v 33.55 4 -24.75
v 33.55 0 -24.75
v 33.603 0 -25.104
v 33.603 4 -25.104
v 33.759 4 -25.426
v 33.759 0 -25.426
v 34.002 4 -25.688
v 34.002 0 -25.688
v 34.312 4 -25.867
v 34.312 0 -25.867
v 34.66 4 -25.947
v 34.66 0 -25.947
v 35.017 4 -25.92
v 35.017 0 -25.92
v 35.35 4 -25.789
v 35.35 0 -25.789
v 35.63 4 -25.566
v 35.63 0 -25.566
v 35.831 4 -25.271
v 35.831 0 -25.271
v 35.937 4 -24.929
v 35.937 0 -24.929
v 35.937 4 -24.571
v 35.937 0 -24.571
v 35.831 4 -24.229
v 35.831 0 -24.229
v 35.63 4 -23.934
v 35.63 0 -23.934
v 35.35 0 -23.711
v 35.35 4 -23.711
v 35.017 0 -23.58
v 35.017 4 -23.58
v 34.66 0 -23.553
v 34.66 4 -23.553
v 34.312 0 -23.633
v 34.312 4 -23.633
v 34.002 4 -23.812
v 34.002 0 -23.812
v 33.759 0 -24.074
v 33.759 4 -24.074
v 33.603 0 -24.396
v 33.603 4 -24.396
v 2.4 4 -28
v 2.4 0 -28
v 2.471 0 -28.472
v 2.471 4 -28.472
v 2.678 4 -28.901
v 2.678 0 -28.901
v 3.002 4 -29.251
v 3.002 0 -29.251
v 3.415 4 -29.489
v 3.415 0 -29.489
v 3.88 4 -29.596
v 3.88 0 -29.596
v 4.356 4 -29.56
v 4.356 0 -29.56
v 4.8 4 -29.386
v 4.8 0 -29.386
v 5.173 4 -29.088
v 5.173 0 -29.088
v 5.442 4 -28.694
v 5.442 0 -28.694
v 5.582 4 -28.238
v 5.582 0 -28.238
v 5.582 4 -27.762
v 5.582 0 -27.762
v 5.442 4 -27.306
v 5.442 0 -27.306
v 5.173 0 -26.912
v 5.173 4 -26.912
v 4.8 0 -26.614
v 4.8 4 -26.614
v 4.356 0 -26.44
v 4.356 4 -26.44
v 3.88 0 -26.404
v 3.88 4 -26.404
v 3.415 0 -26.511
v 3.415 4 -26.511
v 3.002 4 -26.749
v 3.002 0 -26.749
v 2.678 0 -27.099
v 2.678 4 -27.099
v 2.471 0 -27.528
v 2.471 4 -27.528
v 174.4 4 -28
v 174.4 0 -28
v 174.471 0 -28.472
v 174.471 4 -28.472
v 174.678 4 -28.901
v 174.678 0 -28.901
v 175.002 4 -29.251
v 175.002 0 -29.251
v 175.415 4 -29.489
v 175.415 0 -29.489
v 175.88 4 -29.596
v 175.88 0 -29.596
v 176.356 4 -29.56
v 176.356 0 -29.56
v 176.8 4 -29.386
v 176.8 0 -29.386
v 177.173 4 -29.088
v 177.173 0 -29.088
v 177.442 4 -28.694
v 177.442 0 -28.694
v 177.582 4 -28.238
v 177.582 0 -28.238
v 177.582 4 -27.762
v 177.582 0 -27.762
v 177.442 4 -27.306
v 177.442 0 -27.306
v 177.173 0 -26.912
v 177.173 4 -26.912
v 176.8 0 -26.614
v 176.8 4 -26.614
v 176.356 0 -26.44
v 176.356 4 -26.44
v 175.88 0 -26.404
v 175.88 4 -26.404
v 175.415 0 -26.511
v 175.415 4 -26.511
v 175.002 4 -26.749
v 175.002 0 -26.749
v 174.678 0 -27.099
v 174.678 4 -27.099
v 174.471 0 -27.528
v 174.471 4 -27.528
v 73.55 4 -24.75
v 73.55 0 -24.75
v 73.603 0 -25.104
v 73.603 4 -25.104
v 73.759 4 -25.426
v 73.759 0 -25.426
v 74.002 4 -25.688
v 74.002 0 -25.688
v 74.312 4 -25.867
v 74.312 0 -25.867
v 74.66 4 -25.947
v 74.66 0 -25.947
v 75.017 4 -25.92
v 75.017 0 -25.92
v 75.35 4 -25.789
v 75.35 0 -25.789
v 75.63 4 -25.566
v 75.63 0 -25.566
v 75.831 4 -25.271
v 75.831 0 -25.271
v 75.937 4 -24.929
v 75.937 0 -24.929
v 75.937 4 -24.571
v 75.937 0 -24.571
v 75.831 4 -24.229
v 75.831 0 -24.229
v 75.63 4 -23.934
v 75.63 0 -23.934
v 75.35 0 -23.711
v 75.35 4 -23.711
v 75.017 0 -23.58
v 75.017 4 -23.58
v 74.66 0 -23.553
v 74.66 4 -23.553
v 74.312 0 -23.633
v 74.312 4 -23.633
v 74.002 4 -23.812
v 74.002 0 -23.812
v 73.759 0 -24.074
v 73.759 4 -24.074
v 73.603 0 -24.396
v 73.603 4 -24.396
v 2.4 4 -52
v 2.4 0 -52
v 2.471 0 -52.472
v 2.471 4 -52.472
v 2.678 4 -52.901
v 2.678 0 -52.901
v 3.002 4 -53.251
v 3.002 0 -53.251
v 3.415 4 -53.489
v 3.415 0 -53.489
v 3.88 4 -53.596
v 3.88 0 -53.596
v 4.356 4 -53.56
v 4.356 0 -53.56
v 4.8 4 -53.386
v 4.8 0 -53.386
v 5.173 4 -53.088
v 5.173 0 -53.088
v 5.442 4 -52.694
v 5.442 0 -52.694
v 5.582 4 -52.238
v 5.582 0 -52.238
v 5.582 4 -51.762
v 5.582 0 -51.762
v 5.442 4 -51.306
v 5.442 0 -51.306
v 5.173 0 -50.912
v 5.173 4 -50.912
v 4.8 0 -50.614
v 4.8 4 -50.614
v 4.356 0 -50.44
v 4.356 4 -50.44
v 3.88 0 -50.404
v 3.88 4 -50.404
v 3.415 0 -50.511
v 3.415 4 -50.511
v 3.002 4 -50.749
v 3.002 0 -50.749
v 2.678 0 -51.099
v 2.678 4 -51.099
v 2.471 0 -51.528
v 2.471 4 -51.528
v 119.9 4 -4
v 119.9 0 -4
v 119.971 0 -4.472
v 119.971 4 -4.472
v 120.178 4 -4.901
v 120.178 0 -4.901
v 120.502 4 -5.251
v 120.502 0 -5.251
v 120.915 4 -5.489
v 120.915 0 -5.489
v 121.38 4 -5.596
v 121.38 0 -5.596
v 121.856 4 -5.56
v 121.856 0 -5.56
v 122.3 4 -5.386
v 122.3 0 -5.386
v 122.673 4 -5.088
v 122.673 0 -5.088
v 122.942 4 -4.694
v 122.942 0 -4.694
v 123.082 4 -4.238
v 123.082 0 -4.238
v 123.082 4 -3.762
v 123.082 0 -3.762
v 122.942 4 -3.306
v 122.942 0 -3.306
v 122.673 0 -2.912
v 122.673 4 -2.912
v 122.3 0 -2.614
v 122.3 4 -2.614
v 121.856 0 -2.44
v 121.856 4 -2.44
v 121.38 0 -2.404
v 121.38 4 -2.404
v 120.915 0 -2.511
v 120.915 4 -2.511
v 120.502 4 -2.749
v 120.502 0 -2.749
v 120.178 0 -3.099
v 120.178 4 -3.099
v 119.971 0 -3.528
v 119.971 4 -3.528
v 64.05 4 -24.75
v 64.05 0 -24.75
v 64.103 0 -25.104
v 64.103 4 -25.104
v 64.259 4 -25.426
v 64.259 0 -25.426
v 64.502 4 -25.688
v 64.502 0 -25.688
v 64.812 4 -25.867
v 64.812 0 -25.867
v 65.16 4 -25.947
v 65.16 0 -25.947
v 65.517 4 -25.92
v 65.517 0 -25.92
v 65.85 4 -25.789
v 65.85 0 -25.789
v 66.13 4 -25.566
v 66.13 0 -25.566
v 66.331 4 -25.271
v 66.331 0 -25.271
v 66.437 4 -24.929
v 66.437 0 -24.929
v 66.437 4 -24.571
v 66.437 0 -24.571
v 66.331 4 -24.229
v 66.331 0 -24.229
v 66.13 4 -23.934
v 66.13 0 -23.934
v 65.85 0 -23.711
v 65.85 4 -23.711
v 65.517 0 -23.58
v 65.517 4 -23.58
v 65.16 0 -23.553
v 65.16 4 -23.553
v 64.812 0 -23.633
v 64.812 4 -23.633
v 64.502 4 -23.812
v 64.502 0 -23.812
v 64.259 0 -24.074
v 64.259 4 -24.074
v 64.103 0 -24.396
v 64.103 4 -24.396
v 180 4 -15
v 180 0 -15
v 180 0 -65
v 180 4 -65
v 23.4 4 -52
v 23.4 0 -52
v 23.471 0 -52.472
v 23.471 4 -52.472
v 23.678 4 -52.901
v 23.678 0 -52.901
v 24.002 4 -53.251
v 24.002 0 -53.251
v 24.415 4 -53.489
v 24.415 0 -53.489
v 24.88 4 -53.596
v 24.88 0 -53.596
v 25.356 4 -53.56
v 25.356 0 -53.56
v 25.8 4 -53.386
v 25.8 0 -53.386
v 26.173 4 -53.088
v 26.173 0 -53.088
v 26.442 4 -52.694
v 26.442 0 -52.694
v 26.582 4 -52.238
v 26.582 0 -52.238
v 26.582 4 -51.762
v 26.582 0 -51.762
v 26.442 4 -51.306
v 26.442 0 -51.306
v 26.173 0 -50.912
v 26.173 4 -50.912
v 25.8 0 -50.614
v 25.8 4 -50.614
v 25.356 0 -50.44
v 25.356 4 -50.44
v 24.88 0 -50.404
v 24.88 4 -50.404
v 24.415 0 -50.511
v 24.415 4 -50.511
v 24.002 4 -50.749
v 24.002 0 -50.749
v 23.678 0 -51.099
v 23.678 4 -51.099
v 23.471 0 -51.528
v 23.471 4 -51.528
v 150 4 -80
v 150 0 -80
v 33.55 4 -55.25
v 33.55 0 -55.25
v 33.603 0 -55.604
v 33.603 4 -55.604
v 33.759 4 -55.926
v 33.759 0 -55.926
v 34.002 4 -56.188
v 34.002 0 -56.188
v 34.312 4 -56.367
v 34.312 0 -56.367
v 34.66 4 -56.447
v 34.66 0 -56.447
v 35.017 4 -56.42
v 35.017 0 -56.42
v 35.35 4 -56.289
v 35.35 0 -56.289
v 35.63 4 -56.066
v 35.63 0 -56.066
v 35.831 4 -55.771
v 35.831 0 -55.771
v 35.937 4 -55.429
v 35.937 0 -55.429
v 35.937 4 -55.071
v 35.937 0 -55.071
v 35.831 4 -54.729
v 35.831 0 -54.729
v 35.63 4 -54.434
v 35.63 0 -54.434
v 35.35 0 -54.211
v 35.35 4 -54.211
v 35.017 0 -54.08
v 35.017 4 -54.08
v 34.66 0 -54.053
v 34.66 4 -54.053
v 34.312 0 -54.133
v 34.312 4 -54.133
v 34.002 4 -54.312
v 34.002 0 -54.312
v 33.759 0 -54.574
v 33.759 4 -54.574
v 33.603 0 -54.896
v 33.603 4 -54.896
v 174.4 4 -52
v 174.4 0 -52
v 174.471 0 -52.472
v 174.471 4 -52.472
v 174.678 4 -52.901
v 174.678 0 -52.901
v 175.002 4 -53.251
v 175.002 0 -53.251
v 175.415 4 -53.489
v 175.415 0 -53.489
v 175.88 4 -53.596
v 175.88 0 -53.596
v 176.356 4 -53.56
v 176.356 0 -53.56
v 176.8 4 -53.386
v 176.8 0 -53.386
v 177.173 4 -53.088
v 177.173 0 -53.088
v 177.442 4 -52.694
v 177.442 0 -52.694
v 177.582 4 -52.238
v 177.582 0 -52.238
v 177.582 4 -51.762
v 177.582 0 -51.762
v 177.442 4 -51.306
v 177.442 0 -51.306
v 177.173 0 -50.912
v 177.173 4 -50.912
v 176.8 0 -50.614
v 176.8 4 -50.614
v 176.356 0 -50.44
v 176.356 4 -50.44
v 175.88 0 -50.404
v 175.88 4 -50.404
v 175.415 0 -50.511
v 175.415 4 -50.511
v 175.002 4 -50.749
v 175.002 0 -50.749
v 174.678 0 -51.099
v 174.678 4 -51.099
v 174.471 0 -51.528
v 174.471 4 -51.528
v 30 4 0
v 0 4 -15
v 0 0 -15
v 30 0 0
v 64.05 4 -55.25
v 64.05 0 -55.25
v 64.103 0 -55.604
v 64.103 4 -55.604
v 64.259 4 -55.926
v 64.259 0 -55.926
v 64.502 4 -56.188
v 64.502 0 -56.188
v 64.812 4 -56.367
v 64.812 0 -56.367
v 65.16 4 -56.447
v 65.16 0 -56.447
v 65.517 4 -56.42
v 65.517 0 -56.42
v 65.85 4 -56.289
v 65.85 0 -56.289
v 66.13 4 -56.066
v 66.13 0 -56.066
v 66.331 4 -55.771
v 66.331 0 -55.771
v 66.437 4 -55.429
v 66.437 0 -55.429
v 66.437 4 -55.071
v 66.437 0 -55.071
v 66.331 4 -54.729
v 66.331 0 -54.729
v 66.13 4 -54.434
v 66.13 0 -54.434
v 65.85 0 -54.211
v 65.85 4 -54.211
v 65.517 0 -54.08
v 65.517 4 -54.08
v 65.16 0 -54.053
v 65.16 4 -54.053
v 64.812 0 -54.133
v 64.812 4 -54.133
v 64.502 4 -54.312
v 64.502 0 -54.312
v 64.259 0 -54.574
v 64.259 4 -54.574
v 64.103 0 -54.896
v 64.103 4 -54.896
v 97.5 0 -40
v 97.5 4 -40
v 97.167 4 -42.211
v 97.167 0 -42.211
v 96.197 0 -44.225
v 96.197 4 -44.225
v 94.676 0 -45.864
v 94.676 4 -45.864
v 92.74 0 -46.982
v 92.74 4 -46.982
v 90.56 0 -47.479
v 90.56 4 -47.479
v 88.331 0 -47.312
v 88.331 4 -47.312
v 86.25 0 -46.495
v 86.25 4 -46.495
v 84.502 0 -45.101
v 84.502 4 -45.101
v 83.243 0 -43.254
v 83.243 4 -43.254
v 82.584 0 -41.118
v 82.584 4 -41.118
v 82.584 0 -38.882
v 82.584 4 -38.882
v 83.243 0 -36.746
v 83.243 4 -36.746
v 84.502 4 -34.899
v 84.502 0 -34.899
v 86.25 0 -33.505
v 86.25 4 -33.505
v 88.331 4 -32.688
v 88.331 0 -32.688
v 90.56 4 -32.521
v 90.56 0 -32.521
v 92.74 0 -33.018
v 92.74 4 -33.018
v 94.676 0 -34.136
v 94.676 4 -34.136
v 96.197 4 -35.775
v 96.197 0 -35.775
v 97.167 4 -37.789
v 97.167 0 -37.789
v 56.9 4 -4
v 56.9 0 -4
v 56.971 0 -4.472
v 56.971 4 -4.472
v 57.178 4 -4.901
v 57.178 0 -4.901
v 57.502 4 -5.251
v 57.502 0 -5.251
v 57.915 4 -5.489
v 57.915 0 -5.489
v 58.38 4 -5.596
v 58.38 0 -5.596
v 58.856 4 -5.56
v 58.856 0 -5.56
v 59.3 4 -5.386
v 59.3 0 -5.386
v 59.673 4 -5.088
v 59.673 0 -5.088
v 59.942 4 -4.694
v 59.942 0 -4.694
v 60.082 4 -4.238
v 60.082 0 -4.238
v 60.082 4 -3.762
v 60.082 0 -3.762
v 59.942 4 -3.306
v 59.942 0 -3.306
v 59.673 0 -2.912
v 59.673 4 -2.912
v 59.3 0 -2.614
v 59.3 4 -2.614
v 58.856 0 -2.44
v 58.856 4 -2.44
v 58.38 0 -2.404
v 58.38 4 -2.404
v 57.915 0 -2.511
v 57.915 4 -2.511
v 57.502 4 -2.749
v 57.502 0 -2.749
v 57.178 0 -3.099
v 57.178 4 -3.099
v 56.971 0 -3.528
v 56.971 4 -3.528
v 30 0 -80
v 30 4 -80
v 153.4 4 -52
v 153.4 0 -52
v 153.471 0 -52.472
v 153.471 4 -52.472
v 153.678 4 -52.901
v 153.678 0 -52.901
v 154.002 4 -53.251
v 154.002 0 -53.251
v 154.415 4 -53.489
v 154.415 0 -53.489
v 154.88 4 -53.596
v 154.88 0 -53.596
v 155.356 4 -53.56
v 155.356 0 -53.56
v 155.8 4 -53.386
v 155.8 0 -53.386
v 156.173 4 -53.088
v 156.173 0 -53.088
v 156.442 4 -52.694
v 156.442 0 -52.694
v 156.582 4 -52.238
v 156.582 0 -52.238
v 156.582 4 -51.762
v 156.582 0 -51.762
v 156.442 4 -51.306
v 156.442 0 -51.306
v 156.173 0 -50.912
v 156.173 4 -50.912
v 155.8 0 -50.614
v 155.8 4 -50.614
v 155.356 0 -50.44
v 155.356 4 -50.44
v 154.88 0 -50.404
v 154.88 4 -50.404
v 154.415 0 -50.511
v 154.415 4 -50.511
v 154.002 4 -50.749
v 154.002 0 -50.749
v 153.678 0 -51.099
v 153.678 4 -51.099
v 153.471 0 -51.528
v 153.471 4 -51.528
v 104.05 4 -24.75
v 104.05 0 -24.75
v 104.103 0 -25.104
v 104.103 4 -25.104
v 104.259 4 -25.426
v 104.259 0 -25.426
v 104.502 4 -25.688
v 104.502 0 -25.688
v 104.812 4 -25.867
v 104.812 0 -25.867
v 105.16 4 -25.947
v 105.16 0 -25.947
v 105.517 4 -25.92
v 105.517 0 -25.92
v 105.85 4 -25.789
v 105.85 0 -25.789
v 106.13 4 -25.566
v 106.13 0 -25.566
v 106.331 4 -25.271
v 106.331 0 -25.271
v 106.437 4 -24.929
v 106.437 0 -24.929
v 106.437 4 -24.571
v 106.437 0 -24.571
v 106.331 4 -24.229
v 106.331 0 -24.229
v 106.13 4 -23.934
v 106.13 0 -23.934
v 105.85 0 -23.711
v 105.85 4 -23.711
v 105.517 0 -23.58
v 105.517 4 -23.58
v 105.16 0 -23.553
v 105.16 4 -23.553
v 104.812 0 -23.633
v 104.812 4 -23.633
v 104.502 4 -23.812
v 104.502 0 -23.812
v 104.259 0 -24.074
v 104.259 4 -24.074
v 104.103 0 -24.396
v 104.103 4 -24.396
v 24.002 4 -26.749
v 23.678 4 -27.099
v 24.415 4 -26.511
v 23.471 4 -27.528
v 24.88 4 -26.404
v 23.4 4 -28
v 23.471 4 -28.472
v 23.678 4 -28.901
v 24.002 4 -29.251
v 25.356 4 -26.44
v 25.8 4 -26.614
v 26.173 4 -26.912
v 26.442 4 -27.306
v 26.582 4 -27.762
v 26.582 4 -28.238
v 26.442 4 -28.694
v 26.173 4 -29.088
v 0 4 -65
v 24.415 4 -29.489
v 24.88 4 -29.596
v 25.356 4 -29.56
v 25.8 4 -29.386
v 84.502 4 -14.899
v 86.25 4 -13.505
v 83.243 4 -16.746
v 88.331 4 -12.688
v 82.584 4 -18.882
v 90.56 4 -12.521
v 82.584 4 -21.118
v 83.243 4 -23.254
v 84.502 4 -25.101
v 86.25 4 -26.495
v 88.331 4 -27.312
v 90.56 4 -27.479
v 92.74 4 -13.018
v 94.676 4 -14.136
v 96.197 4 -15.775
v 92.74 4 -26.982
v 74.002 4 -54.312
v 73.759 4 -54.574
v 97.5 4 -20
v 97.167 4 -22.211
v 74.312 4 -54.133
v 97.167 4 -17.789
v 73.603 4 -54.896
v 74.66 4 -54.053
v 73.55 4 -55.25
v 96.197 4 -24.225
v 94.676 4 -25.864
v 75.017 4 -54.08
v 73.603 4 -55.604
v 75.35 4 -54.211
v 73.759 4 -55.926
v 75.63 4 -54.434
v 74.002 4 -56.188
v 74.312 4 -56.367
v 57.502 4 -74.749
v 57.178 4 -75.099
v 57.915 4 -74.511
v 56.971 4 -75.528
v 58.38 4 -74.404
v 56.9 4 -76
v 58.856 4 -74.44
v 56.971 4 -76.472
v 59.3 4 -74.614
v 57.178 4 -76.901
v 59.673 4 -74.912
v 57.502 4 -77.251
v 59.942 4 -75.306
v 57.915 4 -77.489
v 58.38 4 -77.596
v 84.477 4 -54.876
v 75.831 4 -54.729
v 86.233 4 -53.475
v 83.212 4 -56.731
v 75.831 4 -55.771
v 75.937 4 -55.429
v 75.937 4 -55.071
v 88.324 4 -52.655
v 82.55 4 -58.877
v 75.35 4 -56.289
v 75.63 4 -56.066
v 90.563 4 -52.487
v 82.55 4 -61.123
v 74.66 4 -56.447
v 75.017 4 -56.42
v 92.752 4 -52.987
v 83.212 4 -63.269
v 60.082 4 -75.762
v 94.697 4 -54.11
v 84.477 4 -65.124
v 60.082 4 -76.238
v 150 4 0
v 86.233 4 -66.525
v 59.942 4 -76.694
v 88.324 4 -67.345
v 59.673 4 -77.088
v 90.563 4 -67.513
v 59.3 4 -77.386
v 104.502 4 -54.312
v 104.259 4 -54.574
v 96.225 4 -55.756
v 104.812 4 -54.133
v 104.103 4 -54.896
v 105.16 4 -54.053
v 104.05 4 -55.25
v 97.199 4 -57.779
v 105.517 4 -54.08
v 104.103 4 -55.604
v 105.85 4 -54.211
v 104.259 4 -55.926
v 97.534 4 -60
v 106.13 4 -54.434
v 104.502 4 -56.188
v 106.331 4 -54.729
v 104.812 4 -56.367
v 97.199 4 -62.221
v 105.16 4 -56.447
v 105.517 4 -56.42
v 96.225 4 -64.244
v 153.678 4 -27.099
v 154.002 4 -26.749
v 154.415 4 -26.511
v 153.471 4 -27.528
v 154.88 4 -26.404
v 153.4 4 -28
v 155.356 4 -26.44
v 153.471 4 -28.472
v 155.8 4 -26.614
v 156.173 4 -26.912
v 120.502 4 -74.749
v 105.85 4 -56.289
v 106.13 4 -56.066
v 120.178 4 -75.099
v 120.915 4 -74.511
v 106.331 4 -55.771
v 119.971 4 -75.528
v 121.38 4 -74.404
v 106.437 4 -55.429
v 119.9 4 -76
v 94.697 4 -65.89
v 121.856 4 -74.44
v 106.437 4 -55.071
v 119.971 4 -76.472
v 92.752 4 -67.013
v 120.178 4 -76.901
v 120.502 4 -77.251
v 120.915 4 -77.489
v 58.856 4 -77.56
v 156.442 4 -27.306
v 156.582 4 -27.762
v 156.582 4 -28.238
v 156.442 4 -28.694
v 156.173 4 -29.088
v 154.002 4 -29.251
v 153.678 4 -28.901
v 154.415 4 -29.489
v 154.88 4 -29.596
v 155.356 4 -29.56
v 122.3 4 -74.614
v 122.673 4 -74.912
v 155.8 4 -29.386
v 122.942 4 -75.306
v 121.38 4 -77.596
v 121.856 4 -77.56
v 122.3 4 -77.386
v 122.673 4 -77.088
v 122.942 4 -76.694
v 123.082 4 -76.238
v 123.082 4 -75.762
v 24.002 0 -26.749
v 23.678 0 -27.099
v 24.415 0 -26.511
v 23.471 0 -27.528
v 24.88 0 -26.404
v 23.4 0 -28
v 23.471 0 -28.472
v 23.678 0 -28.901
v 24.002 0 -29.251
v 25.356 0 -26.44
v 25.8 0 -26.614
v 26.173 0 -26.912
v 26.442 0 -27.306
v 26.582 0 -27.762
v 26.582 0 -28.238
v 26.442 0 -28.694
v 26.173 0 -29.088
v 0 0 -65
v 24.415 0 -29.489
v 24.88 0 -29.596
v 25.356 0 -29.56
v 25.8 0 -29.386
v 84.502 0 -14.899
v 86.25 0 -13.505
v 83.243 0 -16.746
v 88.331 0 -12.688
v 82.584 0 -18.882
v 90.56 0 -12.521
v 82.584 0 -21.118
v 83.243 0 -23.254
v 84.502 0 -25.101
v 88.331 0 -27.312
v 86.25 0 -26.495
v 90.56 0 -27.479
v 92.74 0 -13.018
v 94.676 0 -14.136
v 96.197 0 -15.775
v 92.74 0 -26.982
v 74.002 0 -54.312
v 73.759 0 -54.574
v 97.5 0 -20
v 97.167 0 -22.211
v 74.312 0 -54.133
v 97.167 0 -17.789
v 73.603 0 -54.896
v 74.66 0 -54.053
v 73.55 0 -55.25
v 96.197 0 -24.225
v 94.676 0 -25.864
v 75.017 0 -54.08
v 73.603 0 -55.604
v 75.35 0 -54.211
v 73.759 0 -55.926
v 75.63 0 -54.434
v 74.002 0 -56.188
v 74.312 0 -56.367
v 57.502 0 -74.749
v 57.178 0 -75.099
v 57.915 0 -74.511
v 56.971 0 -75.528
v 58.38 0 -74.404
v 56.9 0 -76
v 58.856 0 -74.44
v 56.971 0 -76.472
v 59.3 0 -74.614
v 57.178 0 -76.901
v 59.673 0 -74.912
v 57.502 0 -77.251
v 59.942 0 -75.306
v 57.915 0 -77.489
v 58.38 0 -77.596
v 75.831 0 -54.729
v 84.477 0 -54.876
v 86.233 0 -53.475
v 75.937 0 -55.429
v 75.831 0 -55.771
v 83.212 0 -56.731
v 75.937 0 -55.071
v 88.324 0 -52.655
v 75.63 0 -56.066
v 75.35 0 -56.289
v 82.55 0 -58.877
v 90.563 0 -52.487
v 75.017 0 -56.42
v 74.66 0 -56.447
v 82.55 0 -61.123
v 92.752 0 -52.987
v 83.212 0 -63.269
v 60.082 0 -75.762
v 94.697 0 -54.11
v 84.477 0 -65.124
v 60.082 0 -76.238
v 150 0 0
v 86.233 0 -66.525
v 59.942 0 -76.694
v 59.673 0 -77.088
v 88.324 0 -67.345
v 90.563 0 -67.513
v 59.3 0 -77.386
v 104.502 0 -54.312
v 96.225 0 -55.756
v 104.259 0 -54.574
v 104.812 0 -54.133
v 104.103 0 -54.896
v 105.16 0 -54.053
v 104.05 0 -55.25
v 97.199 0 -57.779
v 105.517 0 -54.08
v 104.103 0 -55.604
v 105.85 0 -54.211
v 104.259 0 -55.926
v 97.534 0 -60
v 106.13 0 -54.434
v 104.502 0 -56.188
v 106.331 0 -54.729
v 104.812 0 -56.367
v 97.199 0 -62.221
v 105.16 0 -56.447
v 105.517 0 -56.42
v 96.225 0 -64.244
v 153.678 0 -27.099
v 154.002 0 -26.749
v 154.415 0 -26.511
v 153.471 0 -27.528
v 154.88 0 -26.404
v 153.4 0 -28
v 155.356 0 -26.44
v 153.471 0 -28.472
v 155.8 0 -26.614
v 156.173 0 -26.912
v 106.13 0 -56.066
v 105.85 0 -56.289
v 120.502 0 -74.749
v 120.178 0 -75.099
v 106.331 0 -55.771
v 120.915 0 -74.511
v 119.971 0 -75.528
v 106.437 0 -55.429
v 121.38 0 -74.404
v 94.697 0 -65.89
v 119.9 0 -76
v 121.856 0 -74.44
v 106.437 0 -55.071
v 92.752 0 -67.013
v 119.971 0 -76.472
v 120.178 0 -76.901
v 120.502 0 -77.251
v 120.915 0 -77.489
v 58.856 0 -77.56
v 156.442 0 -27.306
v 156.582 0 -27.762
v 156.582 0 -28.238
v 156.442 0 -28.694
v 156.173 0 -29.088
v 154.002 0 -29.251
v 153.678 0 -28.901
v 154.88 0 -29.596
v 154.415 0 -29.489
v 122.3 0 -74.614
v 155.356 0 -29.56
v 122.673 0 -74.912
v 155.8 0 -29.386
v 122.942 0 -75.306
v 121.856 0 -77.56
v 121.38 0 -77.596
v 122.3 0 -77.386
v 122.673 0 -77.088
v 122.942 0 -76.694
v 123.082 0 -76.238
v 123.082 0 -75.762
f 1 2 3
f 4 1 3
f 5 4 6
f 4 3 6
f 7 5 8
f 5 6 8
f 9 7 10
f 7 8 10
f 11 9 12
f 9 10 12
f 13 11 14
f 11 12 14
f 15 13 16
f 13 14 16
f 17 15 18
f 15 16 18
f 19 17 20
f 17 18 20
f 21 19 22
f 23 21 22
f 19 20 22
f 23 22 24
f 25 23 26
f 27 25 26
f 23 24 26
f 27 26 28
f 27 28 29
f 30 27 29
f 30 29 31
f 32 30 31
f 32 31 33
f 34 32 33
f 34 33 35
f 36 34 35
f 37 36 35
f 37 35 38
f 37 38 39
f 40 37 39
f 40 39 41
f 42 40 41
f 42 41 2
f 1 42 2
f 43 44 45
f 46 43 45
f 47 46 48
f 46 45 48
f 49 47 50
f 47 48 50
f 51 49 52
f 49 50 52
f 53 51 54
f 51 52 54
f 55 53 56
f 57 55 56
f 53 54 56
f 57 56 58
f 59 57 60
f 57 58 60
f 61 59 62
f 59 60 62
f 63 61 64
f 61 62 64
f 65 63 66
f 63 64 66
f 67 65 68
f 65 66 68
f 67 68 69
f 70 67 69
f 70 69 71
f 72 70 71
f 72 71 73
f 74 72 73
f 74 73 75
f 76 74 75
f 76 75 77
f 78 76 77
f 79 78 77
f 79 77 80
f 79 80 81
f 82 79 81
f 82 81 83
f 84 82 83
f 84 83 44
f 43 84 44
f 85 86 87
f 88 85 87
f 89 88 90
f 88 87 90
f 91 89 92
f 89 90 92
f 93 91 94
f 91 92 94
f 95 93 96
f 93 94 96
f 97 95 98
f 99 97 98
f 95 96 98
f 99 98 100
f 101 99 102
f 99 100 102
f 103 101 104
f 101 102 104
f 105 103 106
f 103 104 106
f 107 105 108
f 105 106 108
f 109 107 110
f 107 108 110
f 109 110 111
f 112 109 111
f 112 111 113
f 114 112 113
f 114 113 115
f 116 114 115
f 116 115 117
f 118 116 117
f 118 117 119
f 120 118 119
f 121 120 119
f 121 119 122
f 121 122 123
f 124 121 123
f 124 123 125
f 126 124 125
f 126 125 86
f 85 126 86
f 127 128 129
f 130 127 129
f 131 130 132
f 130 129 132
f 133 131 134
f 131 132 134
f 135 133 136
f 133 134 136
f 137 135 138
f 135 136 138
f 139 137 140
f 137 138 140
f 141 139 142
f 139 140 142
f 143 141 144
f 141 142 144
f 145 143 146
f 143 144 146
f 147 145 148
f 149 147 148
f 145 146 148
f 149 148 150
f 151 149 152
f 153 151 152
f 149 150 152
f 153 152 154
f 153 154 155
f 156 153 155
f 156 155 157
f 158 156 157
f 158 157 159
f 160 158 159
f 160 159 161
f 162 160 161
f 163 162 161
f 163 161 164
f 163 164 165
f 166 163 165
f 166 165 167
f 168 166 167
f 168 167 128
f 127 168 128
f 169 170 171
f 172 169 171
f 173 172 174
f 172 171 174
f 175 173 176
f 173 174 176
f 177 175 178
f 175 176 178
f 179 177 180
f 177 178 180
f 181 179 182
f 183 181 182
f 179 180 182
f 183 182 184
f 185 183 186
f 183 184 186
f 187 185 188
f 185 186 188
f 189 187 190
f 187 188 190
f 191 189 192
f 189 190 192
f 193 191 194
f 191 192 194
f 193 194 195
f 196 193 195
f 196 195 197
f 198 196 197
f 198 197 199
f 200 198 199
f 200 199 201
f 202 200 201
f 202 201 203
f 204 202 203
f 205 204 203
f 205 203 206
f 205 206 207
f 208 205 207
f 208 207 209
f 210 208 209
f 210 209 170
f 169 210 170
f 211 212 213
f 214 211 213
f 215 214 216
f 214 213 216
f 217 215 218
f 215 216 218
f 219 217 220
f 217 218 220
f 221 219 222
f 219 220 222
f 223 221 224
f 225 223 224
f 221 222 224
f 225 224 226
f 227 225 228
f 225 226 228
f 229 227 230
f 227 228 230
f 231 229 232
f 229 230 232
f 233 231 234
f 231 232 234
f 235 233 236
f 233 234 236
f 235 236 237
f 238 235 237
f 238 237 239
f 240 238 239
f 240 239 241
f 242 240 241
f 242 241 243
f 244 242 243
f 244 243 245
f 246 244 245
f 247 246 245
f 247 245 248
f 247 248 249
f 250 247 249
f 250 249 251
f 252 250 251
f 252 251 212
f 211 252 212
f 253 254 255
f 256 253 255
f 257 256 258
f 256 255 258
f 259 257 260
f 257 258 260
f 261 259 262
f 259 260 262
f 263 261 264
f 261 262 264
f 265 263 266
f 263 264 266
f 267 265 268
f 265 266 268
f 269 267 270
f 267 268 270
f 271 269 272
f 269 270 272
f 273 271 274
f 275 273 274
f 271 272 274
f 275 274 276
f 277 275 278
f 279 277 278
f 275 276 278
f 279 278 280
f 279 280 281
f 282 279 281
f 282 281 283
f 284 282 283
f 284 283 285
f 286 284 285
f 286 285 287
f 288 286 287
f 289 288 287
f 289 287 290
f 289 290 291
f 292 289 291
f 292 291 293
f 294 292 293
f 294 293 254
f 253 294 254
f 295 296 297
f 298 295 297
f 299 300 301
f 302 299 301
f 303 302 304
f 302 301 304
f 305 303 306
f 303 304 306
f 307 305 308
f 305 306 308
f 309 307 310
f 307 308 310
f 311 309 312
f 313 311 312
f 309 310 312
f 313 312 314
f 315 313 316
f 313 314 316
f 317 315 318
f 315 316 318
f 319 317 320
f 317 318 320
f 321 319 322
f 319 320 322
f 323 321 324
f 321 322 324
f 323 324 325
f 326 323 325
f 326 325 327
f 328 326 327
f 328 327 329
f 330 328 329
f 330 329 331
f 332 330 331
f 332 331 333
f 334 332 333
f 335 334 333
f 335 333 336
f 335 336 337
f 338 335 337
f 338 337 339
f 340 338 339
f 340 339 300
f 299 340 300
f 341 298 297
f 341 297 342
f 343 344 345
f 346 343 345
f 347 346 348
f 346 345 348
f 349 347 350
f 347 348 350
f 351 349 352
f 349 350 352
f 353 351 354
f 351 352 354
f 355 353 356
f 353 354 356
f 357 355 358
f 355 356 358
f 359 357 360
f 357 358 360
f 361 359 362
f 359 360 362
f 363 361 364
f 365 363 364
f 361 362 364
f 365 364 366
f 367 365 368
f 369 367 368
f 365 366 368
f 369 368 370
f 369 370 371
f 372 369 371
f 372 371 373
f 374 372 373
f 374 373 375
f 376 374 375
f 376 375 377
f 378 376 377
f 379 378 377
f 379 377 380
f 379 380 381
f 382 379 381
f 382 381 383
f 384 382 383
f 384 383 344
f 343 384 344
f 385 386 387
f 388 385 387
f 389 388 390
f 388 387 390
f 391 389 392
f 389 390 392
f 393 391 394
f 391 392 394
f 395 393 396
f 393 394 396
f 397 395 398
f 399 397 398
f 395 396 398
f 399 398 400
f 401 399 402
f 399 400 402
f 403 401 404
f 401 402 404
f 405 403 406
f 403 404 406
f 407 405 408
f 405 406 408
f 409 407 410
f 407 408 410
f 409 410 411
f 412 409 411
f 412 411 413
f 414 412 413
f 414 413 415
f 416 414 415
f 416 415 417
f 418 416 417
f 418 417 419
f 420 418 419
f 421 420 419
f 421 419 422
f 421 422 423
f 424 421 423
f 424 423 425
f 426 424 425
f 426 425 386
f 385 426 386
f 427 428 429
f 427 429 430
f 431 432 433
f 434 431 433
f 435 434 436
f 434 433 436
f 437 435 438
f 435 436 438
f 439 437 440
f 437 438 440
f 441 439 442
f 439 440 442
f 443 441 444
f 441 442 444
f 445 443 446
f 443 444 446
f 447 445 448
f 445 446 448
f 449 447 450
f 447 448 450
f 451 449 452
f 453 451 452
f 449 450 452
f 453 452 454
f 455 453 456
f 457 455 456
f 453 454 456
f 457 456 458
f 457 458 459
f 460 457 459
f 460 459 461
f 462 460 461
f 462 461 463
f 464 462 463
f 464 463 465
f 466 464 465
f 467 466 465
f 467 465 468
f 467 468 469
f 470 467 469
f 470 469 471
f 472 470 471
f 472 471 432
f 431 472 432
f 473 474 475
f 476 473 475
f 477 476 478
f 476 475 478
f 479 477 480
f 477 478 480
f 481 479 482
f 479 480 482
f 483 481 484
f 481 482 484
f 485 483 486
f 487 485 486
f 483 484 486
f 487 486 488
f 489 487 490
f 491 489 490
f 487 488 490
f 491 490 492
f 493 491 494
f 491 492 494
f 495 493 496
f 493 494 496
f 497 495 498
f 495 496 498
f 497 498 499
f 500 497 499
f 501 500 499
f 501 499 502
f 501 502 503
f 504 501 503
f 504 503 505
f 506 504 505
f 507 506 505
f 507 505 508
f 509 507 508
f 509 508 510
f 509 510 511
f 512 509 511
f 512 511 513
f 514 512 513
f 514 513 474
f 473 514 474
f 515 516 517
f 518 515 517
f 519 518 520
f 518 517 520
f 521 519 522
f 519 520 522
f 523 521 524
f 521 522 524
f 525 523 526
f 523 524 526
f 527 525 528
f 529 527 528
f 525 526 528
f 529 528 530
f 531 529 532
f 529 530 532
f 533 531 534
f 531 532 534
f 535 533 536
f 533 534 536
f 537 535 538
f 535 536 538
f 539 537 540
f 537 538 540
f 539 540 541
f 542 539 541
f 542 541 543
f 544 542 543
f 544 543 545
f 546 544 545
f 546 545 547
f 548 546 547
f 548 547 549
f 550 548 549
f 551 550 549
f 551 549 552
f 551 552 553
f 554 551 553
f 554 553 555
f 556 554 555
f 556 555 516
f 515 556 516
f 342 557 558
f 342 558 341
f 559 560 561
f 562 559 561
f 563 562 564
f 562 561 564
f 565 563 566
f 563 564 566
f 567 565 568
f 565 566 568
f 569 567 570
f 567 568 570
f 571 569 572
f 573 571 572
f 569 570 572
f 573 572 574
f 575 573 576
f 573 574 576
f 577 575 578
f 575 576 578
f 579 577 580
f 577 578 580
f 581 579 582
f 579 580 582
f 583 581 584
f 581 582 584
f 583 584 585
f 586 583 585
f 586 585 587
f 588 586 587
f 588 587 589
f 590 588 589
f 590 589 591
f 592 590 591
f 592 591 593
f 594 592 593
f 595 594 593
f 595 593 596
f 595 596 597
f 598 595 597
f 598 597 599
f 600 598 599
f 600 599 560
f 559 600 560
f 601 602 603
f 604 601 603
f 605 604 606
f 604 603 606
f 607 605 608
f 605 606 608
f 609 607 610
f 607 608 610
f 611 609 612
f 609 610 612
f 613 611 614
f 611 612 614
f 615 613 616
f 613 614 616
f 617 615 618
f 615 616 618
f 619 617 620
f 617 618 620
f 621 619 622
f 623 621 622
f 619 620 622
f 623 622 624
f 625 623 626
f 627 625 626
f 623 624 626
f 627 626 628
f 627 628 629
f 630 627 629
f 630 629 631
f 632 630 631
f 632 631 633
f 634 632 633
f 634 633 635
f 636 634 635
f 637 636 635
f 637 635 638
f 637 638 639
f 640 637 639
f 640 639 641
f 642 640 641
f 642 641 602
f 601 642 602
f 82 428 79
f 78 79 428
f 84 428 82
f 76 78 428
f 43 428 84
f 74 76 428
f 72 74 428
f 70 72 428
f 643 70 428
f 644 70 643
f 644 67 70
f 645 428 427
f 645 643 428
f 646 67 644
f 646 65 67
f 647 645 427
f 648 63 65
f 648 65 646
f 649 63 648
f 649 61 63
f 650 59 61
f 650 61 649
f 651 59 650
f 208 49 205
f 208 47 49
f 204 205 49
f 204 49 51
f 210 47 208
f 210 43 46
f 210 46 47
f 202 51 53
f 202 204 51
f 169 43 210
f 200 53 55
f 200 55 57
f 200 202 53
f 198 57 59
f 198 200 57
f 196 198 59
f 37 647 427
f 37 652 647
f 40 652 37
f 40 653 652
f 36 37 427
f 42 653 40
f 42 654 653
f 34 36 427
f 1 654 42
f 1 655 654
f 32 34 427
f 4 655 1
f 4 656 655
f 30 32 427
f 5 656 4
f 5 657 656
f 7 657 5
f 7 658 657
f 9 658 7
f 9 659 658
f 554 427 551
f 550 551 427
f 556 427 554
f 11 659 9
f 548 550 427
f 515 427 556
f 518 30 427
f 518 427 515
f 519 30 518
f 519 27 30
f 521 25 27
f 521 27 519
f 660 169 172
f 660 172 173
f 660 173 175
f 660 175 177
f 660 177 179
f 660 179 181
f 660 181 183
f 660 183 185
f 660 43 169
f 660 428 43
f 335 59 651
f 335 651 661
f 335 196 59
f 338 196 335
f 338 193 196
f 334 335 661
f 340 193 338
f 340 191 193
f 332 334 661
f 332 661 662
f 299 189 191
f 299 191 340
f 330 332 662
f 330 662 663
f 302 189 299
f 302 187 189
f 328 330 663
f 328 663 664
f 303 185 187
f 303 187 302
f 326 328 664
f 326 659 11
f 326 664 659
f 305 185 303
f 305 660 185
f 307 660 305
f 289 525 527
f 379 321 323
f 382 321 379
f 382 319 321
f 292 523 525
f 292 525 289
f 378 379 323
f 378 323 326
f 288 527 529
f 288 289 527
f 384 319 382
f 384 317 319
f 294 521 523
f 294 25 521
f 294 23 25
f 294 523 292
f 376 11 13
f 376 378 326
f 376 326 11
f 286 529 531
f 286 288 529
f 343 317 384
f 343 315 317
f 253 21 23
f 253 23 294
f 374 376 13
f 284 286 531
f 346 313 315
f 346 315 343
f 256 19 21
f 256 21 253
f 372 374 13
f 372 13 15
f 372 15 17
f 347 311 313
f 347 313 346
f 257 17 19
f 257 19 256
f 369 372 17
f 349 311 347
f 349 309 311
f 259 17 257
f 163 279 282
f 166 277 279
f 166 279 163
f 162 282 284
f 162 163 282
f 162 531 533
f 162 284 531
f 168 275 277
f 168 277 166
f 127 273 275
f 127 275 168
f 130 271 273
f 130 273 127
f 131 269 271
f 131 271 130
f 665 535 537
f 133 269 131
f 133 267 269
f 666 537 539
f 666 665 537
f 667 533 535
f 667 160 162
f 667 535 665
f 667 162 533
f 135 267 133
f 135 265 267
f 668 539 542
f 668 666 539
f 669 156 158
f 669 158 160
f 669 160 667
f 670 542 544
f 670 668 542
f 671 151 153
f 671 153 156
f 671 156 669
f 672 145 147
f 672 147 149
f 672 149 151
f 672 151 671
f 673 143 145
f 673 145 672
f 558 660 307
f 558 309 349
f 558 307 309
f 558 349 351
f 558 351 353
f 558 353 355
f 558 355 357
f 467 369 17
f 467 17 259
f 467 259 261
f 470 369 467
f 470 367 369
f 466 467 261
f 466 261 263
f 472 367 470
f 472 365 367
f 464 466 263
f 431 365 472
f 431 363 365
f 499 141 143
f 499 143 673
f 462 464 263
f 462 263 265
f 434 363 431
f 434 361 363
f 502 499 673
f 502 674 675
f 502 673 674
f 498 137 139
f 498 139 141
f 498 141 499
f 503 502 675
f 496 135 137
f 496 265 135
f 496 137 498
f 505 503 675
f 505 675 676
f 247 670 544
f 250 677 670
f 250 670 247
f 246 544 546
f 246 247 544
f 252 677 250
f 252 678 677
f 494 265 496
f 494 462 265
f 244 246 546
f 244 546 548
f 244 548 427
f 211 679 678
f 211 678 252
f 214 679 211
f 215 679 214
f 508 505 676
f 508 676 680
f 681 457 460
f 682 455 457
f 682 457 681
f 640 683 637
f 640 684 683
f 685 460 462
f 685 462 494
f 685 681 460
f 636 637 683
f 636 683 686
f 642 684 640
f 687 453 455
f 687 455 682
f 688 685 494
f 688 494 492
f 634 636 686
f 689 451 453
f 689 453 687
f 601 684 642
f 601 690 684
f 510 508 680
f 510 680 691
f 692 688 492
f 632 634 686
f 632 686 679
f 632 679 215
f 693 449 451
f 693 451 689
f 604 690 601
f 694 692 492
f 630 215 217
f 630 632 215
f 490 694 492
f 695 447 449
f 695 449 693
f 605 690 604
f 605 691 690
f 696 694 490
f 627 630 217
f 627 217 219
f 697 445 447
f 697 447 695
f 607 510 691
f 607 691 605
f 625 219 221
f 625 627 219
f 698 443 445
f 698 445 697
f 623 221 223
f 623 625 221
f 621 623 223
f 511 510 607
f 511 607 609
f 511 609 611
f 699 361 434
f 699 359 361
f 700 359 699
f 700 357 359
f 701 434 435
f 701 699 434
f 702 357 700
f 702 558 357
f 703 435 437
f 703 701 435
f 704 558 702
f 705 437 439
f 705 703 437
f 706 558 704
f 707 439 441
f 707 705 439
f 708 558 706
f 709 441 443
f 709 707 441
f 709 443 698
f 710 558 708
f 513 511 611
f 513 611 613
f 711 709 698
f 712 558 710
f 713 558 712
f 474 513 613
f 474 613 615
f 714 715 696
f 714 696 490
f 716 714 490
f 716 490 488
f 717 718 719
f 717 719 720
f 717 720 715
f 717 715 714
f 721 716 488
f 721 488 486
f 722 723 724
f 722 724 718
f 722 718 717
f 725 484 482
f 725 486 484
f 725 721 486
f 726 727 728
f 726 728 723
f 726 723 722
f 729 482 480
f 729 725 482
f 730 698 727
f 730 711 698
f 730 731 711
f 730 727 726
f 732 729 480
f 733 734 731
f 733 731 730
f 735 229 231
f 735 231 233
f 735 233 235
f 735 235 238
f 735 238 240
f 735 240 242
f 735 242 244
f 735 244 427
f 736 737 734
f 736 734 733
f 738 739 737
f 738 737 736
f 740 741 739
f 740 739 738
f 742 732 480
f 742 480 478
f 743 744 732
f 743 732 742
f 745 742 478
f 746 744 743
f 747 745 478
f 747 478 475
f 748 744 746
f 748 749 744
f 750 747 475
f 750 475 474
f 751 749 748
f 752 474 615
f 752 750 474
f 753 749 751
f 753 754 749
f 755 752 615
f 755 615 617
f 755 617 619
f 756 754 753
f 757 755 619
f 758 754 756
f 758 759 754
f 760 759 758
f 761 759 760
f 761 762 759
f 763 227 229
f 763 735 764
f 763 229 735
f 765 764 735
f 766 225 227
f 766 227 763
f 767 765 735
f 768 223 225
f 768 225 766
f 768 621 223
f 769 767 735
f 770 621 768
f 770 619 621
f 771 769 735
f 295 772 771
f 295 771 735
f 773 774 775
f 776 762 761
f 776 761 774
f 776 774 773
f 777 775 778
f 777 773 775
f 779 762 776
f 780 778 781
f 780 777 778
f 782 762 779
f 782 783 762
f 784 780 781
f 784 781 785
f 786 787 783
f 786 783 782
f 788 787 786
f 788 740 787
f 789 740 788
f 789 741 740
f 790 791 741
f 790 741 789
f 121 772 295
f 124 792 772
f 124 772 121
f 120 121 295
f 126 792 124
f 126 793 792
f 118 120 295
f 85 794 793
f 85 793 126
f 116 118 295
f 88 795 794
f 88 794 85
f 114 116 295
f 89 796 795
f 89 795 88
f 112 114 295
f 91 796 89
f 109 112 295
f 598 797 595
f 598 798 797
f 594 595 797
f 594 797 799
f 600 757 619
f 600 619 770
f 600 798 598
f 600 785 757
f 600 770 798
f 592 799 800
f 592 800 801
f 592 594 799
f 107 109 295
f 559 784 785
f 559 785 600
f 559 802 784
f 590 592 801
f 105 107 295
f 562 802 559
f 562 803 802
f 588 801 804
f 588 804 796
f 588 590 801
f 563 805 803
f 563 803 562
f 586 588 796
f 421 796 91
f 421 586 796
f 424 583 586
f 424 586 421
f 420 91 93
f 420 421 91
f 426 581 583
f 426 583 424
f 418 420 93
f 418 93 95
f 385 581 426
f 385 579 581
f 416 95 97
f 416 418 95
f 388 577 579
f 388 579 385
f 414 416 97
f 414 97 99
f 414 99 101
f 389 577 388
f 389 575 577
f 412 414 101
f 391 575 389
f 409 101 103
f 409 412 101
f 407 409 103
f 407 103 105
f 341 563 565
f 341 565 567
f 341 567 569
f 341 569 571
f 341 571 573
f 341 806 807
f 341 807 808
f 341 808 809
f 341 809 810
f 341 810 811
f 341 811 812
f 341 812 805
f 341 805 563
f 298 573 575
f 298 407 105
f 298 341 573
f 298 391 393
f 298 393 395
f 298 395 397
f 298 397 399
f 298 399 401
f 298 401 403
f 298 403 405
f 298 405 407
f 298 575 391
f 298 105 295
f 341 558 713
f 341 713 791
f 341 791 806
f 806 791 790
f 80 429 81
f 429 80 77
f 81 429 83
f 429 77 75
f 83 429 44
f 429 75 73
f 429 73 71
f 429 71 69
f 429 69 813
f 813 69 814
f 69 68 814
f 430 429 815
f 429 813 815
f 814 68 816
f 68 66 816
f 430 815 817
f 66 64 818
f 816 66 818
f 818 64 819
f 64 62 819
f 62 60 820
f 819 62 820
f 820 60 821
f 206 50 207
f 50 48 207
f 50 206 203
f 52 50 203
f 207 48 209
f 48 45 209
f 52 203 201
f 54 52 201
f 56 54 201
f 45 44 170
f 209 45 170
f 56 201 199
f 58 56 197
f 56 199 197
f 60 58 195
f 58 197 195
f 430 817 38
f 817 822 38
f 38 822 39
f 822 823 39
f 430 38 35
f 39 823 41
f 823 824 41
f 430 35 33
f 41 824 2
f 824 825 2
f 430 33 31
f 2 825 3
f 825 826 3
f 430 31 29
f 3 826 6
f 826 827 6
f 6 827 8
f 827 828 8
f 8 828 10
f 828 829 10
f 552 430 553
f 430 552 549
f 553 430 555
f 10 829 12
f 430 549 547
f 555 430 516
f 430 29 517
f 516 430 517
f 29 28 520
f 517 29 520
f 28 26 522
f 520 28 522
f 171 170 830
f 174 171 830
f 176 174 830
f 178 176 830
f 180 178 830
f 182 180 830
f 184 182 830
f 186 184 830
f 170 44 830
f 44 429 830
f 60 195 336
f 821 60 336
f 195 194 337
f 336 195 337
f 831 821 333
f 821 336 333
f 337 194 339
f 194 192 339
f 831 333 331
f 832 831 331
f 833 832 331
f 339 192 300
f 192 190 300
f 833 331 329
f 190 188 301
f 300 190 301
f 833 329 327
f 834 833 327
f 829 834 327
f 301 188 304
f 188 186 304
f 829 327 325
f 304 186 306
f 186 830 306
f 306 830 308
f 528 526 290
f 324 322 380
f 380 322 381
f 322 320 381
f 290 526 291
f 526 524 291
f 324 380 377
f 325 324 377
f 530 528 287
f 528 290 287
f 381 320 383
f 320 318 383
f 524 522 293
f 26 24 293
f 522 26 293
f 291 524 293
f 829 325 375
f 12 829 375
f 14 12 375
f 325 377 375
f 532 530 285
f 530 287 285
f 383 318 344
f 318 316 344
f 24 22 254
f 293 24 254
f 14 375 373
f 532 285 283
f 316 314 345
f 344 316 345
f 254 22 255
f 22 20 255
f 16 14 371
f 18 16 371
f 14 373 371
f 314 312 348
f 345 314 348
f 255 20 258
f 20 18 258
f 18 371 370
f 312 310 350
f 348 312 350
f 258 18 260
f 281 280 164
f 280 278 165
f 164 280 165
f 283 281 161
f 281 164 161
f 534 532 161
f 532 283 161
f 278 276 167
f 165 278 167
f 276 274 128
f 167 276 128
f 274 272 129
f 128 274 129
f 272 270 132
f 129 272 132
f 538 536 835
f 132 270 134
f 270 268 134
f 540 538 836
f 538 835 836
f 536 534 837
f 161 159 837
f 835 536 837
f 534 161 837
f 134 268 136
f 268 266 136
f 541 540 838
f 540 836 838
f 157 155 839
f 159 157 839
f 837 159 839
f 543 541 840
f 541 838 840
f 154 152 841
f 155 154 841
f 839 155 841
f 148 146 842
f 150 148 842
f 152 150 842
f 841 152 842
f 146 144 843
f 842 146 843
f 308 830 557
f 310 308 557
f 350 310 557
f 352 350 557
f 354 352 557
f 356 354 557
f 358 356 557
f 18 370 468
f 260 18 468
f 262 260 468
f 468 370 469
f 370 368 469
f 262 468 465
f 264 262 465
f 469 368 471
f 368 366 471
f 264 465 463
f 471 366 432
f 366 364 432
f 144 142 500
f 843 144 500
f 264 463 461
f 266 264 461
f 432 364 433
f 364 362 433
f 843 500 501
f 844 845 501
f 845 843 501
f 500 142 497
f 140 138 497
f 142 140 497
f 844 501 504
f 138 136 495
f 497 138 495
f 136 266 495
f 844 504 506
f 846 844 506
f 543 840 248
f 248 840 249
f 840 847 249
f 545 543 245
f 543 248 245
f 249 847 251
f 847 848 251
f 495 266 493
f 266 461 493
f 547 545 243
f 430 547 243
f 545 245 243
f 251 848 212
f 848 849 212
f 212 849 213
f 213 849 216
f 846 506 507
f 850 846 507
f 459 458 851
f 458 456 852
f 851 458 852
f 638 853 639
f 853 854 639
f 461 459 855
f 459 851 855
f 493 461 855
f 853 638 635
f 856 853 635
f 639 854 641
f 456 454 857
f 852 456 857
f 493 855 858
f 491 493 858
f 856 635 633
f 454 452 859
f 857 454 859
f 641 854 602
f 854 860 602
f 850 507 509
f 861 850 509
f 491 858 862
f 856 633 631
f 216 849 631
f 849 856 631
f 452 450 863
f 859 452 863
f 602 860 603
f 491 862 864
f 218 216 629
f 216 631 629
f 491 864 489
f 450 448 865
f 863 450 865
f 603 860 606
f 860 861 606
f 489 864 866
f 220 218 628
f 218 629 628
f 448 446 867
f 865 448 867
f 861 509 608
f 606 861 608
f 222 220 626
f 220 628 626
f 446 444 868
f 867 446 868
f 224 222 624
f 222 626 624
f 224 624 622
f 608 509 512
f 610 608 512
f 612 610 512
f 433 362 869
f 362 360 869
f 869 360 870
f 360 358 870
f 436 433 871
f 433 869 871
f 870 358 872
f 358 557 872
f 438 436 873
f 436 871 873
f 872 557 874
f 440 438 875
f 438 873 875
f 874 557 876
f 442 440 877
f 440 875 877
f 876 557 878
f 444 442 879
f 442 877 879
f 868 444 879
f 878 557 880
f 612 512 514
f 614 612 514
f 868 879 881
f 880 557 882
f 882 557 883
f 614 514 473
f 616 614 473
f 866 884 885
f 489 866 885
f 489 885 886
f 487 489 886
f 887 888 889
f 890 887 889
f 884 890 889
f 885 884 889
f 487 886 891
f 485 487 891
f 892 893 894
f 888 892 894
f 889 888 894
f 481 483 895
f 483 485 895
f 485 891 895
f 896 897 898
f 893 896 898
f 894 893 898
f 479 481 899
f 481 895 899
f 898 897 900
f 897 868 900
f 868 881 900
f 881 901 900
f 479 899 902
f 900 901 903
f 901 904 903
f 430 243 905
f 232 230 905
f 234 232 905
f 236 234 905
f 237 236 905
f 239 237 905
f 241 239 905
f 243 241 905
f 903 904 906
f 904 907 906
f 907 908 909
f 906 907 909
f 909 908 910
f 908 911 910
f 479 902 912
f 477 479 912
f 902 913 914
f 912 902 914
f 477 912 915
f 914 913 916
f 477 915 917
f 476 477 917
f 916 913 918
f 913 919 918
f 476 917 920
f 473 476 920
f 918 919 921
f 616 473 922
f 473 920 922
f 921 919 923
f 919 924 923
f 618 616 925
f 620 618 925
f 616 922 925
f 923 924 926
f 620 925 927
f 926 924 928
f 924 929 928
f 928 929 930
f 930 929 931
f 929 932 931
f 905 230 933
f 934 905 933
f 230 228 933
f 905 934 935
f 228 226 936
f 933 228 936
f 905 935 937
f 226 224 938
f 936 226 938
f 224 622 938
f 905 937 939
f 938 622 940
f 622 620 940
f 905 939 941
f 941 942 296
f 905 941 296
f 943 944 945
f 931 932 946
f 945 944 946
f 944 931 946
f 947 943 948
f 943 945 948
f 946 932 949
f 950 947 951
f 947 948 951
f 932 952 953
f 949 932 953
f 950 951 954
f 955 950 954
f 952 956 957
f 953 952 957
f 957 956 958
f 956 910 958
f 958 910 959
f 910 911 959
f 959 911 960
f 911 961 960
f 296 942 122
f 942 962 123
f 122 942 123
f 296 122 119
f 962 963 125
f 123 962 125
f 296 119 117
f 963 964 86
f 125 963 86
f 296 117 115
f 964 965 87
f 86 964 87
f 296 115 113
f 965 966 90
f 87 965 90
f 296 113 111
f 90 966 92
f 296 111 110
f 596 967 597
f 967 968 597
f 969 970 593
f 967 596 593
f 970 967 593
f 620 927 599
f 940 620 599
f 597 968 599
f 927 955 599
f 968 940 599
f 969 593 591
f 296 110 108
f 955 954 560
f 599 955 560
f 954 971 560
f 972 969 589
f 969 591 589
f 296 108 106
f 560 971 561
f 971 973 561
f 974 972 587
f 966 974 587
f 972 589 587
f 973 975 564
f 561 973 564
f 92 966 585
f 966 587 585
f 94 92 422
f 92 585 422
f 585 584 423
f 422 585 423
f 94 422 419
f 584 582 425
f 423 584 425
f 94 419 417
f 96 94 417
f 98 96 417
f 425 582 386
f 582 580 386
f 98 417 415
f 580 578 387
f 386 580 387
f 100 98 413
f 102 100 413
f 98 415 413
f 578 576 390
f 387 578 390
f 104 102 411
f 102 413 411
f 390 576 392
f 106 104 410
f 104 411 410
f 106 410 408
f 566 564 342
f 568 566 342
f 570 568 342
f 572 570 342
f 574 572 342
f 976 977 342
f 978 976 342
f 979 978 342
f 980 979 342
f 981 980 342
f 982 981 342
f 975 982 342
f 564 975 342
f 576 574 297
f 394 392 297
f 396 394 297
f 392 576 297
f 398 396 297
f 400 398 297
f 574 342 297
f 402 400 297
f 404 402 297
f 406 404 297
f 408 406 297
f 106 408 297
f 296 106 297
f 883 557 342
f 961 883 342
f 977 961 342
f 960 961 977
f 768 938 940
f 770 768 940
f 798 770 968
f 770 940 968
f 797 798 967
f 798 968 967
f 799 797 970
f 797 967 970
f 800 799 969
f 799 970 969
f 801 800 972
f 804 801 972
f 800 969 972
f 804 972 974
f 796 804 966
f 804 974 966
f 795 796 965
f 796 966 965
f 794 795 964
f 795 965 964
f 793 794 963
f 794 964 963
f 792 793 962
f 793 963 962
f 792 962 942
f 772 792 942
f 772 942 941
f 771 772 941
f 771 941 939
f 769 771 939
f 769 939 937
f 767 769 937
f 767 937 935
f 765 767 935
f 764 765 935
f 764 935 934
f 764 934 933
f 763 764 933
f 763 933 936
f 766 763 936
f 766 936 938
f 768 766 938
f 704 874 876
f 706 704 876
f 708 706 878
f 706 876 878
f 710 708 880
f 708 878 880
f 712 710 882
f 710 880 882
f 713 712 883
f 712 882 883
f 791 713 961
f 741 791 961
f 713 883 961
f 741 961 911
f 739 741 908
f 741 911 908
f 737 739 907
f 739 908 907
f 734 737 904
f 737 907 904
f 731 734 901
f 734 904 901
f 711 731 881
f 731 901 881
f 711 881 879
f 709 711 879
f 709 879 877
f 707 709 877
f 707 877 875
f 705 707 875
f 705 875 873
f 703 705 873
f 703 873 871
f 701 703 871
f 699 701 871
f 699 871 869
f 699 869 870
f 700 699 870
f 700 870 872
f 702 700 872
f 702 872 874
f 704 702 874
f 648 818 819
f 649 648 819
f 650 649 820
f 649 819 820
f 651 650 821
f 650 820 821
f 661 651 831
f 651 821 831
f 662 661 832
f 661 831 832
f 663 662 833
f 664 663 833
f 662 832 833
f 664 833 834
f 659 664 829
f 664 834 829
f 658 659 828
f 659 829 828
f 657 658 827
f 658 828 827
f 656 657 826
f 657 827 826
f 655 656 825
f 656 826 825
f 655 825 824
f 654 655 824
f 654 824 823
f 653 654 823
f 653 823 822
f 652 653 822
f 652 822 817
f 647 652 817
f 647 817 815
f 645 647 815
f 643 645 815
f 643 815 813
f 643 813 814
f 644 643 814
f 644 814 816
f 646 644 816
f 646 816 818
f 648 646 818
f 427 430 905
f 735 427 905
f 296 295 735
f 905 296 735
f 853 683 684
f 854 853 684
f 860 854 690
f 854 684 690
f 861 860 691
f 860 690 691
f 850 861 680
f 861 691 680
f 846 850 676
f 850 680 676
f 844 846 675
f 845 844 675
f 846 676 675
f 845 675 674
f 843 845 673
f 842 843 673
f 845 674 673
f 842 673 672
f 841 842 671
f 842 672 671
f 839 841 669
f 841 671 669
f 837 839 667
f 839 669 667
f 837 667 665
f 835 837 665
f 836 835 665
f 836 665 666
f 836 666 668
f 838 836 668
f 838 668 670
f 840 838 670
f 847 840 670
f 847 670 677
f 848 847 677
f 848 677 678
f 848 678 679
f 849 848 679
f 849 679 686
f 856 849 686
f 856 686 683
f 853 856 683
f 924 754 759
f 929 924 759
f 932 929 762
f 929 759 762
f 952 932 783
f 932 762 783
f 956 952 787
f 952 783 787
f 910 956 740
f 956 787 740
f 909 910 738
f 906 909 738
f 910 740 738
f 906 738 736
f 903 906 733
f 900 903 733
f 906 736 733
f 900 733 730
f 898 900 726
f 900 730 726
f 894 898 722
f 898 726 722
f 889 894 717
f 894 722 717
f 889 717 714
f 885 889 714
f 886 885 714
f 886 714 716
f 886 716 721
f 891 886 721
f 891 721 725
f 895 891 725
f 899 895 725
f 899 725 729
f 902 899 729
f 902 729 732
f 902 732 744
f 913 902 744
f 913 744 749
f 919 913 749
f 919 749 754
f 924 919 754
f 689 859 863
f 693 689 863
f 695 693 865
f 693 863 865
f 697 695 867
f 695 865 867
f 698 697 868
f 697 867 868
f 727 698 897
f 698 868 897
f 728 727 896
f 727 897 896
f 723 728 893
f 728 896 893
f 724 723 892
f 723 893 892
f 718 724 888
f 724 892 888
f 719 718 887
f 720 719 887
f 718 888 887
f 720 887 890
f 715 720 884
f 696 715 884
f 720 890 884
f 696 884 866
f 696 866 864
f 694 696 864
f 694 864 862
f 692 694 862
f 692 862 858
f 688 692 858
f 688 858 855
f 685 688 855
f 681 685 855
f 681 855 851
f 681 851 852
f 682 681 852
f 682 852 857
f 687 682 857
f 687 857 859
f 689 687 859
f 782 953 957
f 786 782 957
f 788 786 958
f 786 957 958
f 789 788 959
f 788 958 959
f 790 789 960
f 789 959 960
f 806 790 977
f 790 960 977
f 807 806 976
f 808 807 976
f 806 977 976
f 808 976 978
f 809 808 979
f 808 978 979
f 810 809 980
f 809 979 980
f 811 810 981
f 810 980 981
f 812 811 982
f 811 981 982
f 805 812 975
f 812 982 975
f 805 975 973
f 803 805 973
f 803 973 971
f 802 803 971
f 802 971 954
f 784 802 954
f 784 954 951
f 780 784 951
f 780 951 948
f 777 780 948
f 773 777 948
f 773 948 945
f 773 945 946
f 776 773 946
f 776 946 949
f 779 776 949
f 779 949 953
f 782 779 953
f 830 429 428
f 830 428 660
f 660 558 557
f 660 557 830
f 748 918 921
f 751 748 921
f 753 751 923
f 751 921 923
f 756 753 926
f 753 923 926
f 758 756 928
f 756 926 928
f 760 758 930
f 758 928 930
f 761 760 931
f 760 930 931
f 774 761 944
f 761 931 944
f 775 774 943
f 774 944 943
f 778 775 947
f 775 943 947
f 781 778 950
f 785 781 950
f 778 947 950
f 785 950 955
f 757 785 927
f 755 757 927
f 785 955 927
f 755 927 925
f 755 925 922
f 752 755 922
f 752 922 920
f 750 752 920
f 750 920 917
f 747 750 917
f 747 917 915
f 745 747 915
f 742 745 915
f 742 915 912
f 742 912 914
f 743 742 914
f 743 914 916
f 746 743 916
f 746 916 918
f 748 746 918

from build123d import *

# Parameters (mm, degrees)
ESQUISSE1_W             = 180
ESQUISSE1_H             = 80
BOSS_EXTRU_1_DEPTH      = 4
ENL_V_MAT_EXTRU_1_DEPTH = 4
D_GAGEMENT_M22_D        = 2.4
D_GAGEMENT_M23_D        = 2.4
D_GAGEMENT_M31_D        = 3.2
D_GAGEMENT_M31_DEPTH    = 4
ESQUISSE17_R            = 7.534005168
ESQUISSE17_R_2          = 7.5
ENL_V_MAT_EXTRU_2_DEPTH = 10


with BuildPart() as part:
    # Esquisse1 → Boss.-Extru.1 (new body)
    with BuildSketch(Plane(origin=(0, 0, 0), x_dir=(1, 0, 0), z_dir=(0, 1, 0))):
        with Locations((90, 40)):
            Rectangle(ESQUISSE1_W, ESQUISSE1_H)
    extrude(amount=BOSS_EXTRU_1_DEPTH)

    # Esquisse2 → Enlèv. mat.-Extru.1 (cut)
    with BuildSketch(Plane(origin=(0, 4, 0), x_dir=(1, 0, 0), z_dir=(0, 1, 0))):
        Polygon((0, 15), (30, 0), (0, 0), align=None)
        Polygon((30, 80), (0, 65), (0, 80), align=None)
        Polygon((150, 80), (180, 80), (180, 65), align=None)
        Polygon((180, 15), (150, 0), (180, 0), align=None)
    extrude(amount=-ENL_V_MAT_EXTRU_1_DEPTH, mode=Mode.SUBTRACT)

    # Dégagement M22 (through all)
    with Locations(Plane(origin=(0, 4, 0), x_dir=(1, 0, 0), z_dir=(0, 1, 0))):
        with Locations((74.75, 55.25), (105.25, 55.25), (105.25, 24.75), (74.75, 24.75)):
            Hole(D_GAGEMENT_M22_D / 2)

    # Dégagement M23 (through all)
    with Locations(Plane(origin=(0, 4, 0), x_dir=(1, 0, 0), z_dir=(0, 1, 0))):
        with Locations((34.75, 24.75), (65.25, 24.75), (65.25, 55.25), (34.75, 55.25)):
            Hole(D_GAGEMENT_M23_D / 2)

    # Dégagement M31
    with Locations(Plane(origin=(0, 4, 0), x_dir=(1, 0, 0), z_dir=(0, 1, 0))):
        with Locations((4, 52), (4, 28), (25, 28), (25, 52), (58.5, 76), (58.5, 4), (121.5, 4), (121.5, 76), (155, 52), (176, 52), (176, 28), (155, 28)):
            Hole(D_GAGEMENT_M31_D / 2, depth=D_GAGEMENT_M31_DEPTH)

    # Esquisse17 → Enlèv. mat.-Extru.2 (cut)
    with BuildSketch(Plane(origin=(0, 4, 0), x_dir=(1, 0, 0), z_dir=(0, 1, 0))):
        with Locations((90, 60)):
            Circle(ESQUISSE17_R)
        with Locations((90, 40)):
            Circle(ESQUISSE17_R_2)
        with Locations((90, 20)):
            Circle(ESQUISSE17_R_2)
    extrude(amount=-ENL_V_MAT_EXTRU_2_DEPTH, mode=Mode.SUBTRACT)


solid = part.part
